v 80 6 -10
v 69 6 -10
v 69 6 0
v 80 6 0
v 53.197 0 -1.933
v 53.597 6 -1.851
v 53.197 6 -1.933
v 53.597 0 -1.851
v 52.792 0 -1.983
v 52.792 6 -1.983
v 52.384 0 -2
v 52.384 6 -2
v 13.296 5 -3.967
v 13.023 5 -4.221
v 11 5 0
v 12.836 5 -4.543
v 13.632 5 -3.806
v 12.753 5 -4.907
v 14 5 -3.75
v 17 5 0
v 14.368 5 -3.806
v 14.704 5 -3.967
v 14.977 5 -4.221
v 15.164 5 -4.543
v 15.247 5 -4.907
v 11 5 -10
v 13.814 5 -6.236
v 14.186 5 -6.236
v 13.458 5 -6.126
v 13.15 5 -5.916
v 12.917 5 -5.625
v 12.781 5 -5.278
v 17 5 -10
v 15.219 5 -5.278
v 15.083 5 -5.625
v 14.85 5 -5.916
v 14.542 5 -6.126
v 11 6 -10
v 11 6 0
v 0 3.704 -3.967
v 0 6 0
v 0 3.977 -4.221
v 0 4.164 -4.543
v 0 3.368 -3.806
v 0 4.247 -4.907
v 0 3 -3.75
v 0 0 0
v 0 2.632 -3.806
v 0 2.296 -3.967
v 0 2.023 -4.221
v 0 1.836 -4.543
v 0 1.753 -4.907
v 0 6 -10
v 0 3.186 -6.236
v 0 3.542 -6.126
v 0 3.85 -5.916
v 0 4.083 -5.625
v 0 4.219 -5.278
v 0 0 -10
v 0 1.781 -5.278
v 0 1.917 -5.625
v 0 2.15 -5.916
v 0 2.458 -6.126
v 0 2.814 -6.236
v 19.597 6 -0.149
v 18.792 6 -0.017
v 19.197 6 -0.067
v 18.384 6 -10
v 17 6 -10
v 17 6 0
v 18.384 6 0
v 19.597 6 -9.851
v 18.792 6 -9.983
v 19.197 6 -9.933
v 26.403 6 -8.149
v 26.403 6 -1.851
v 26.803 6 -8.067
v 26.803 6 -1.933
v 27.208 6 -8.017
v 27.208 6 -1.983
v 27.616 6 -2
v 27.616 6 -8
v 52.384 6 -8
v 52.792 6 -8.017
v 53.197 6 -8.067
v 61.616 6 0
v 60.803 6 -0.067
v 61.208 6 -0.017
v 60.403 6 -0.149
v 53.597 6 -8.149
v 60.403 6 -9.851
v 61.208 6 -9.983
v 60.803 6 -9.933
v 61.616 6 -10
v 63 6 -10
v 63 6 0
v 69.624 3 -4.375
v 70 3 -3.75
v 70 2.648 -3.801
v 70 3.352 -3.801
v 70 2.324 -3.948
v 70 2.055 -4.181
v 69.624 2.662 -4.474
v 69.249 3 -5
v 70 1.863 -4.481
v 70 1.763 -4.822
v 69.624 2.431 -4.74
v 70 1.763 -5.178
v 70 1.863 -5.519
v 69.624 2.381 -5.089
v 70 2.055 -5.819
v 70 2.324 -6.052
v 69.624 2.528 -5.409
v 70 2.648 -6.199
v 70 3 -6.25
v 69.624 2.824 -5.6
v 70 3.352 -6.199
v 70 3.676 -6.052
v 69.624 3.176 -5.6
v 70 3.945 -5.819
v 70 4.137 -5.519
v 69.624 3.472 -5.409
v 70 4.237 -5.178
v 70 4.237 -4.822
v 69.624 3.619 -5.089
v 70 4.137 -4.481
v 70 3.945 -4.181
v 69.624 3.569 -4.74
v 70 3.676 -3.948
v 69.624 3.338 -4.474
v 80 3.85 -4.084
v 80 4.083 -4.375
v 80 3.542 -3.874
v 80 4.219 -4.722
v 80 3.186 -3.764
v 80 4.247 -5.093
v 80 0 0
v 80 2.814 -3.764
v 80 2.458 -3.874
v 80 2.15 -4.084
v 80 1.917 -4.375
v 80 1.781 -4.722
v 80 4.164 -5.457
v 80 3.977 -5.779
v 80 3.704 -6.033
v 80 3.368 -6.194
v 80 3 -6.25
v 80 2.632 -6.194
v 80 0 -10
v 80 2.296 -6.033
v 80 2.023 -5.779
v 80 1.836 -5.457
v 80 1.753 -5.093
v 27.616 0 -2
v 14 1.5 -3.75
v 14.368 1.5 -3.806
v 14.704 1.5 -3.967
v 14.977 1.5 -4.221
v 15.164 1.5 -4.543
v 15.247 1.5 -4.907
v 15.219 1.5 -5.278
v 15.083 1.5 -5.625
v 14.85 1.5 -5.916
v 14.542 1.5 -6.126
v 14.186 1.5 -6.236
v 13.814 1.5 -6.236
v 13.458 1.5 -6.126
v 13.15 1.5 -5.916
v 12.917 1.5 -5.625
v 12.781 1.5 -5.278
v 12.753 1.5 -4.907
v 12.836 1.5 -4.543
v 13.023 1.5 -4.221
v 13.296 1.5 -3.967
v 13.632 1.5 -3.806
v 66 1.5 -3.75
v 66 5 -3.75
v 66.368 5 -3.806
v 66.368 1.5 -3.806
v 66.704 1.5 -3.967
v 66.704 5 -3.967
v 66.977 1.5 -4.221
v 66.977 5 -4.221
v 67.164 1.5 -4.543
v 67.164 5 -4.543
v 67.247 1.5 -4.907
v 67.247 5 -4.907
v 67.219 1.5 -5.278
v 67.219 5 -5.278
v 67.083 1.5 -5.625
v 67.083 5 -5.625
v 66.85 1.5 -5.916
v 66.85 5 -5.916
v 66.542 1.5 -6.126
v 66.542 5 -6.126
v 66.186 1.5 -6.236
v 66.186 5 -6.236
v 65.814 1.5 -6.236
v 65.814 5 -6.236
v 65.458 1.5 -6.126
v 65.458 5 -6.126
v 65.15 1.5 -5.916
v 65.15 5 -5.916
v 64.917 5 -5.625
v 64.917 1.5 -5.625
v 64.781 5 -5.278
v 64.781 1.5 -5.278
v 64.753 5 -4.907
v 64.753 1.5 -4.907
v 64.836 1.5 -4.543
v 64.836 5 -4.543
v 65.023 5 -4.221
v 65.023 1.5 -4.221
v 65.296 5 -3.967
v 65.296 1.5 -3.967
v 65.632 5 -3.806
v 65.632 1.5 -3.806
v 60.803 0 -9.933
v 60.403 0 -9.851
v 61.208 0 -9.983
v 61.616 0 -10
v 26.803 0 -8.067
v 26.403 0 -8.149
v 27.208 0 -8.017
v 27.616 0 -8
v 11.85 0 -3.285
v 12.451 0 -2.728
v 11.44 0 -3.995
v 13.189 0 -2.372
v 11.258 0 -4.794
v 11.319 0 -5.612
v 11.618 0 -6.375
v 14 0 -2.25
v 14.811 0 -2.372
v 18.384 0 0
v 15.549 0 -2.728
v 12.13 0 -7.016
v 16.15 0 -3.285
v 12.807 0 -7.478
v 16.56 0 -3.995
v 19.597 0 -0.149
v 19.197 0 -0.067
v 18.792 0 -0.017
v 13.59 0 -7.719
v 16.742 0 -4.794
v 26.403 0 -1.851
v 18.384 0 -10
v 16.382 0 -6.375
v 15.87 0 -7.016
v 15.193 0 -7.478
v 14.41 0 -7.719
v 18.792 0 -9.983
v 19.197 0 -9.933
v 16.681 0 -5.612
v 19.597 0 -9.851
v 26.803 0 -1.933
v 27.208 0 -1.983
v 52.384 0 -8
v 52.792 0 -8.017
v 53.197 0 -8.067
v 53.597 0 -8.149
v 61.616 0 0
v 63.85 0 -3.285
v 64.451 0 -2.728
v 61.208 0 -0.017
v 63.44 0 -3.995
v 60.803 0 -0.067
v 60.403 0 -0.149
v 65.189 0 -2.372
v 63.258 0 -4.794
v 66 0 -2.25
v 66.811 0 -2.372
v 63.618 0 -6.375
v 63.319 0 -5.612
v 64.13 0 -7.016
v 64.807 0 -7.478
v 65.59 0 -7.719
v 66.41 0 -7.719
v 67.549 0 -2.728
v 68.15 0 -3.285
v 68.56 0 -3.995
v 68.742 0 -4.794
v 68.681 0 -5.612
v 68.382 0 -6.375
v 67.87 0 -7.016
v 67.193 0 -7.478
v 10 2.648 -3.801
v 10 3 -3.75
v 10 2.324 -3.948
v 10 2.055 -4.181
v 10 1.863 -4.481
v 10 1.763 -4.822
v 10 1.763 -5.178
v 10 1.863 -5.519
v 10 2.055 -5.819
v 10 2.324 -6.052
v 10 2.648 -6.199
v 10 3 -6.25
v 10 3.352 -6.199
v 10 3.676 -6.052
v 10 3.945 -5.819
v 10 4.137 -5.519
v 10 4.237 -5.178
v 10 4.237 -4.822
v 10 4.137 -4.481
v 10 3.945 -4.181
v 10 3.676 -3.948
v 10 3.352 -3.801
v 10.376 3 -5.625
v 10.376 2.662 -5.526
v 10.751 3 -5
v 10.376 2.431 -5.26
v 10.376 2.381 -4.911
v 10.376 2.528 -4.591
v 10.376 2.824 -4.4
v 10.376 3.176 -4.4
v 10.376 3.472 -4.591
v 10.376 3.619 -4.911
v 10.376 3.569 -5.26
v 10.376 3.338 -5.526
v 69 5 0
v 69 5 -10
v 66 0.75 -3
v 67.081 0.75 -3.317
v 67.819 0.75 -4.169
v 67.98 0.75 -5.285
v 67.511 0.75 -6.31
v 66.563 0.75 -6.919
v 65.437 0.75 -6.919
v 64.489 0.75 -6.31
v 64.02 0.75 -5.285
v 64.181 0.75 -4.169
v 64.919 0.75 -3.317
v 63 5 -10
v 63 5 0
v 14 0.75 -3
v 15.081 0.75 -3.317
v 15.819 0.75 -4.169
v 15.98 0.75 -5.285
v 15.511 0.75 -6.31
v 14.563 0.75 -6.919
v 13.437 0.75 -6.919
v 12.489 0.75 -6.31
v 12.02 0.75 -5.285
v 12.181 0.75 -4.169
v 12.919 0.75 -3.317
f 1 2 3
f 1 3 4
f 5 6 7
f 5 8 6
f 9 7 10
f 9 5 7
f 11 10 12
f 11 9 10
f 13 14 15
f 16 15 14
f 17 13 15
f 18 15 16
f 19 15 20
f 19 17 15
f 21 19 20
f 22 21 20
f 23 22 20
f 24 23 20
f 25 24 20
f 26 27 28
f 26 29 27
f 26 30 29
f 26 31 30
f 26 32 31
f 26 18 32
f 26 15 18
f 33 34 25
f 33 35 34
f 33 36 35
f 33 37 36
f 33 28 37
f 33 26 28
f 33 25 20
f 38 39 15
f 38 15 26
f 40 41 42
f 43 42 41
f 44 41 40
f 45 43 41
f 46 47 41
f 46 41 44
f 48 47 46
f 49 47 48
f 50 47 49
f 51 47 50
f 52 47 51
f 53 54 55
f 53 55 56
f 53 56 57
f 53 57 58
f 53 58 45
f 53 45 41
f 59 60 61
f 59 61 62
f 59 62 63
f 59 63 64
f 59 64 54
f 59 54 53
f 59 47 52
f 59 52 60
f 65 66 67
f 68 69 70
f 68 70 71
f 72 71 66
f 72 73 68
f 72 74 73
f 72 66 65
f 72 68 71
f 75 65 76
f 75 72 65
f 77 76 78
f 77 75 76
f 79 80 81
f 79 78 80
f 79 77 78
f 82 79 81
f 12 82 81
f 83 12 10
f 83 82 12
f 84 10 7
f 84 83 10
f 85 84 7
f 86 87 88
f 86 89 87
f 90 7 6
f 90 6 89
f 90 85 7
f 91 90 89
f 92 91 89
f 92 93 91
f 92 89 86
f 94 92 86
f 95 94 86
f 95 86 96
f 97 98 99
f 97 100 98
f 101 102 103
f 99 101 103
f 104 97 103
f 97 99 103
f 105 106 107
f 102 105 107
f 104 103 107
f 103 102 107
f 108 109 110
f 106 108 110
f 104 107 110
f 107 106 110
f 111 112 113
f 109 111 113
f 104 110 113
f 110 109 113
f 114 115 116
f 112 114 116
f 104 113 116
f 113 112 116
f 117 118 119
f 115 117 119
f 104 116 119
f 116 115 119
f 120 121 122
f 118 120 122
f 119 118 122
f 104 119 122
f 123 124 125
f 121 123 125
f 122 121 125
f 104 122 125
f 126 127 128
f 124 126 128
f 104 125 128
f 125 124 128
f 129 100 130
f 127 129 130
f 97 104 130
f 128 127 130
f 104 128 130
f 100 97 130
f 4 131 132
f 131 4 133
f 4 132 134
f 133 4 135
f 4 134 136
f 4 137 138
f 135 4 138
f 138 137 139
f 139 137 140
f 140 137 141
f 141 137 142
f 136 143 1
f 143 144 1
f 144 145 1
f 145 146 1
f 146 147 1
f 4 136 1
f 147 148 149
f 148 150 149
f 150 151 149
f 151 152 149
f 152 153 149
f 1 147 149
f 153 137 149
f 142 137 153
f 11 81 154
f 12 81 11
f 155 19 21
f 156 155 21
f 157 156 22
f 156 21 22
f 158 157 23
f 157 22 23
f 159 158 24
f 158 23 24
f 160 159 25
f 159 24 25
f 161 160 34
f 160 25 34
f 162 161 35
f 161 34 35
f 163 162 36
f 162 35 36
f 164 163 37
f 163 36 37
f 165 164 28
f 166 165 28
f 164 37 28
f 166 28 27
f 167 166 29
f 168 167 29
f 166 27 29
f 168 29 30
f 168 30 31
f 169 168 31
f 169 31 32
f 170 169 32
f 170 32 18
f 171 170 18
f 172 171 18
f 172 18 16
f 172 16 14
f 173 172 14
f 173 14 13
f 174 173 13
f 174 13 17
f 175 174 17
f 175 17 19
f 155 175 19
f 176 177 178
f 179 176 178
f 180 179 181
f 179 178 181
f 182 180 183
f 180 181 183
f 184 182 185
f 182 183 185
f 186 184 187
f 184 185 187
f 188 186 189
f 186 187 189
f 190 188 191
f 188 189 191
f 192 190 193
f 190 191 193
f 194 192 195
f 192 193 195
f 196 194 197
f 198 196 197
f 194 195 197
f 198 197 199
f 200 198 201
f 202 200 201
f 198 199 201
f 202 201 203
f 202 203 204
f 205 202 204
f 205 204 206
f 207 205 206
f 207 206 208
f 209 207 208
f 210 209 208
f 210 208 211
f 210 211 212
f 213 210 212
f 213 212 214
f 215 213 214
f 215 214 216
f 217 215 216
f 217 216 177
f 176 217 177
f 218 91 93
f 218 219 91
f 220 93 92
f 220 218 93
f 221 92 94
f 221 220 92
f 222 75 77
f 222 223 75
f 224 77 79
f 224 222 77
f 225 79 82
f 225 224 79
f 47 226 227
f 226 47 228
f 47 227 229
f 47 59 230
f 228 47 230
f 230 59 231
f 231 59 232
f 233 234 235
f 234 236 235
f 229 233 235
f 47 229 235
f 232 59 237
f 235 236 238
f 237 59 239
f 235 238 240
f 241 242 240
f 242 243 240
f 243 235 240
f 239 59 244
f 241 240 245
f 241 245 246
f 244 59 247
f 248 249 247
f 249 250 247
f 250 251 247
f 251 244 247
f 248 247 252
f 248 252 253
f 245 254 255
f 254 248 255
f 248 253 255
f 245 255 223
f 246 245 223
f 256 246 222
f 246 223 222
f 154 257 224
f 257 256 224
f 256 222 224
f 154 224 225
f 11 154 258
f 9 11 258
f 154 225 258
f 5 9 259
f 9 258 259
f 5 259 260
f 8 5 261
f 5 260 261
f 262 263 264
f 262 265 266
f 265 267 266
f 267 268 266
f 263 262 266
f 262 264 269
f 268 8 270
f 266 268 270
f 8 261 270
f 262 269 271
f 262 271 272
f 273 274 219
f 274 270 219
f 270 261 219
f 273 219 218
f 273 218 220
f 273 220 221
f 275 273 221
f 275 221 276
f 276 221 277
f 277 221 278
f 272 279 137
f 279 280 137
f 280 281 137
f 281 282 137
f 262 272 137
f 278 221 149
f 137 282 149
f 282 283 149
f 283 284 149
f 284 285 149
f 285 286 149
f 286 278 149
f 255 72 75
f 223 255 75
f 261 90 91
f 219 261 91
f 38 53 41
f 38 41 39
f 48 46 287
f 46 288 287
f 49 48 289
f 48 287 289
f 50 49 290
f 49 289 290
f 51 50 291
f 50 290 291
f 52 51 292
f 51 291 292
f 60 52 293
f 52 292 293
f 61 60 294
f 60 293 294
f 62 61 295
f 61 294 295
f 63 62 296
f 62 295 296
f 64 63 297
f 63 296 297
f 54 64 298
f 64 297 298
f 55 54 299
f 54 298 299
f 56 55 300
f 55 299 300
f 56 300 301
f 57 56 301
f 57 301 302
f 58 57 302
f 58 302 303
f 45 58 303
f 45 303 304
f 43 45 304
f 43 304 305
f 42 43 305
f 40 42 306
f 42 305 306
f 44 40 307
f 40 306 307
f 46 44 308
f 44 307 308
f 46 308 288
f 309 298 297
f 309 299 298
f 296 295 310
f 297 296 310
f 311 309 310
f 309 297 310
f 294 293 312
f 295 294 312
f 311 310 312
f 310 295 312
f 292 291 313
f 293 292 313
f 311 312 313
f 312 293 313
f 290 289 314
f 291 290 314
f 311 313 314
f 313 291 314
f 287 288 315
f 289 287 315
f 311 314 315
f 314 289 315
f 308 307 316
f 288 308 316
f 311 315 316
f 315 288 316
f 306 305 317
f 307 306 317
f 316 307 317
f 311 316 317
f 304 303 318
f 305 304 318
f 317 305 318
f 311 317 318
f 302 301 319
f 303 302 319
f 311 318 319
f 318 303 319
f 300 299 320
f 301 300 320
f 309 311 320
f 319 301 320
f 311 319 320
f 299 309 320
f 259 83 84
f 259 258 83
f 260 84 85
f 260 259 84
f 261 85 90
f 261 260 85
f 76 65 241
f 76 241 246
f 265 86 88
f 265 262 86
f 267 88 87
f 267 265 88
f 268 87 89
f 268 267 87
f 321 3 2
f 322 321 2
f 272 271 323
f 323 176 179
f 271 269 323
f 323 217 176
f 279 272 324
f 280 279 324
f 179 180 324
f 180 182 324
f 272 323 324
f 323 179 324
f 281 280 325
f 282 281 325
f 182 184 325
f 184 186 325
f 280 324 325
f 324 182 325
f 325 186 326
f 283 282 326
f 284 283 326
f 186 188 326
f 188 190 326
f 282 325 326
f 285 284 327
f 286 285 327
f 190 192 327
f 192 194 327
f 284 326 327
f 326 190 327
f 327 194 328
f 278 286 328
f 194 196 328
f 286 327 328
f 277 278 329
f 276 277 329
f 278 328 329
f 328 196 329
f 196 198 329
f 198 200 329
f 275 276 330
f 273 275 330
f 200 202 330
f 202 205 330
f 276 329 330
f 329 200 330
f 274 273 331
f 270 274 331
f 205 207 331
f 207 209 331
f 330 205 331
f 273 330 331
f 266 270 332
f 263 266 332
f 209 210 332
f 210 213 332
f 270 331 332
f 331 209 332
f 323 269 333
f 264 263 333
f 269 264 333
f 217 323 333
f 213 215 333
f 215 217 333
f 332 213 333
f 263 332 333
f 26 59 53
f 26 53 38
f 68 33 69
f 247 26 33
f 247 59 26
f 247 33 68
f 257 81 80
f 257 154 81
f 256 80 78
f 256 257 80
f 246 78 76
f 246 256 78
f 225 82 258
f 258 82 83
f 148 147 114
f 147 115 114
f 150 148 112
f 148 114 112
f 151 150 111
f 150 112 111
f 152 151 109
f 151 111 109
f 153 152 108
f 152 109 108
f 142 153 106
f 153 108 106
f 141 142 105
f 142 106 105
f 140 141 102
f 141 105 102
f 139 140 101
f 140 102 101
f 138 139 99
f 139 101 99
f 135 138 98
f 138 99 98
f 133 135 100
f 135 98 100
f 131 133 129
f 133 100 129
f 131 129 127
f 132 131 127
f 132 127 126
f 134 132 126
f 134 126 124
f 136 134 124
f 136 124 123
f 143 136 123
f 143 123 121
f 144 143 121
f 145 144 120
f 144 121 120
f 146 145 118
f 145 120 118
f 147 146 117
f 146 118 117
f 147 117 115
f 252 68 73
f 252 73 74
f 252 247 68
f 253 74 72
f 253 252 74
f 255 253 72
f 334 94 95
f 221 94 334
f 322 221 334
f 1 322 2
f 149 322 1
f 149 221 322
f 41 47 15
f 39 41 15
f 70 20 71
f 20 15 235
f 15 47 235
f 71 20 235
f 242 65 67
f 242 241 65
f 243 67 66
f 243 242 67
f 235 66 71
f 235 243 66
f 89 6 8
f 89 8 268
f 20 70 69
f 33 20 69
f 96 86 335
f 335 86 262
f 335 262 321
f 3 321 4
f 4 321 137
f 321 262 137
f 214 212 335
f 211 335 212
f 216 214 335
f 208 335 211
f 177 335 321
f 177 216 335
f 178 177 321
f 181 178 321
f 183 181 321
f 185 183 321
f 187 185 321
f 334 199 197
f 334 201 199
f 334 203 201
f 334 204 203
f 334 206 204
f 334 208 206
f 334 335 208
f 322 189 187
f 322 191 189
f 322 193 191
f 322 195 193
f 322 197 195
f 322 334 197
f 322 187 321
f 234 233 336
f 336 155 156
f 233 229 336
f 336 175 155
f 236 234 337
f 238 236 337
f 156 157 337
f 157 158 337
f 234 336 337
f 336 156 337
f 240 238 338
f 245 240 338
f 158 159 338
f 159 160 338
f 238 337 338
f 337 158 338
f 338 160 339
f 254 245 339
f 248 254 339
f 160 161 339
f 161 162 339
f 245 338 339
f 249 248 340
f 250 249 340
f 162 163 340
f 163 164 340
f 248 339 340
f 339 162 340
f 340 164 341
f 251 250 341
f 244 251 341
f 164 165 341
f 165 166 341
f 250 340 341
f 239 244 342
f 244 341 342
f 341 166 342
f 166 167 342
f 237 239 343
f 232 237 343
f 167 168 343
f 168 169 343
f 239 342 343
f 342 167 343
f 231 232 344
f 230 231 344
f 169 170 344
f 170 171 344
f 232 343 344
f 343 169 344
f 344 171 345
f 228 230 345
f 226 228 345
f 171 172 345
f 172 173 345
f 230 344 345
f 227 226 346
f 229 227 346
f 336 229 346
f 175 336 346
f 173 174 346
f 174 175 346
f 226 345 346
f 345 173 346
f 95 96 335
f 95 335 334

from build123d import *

# Parameters (mm, degrees)
SKETCH1_W                                 = 80
SKETCH1_H                                 = 10
BOSS_EXTRUDE1_DEPTH                       = 6
SKETCH2_W                                 = 6
SKETCH2_H                                 = 10
CUT_EXTRUDE1_DEPTH                        = 1
TAP_DRILL_FOR_M3X0_5_TAP1_D               = 2.5
TAP_DRILL_FOR_M3X0_5_TAP1_DEPTH           = 10
TAP_DRILL_FOR_M3X0_5_TAP1_TIP             = 0.751075774
TAP_DRILL_FOR_M3X0_5_TAP1_ON_FACE_2_D     = 2.5
TAP_DRILL_FOR_M3X0_5_TAP1_ON_FACE_2_DEPTH = 10
TAP_DRILL_FOR_M3X0_5_TAP1_ON_FACE_2_TIP   = 0.751075774
TAP_DRILL_FOR_M3X0_5_TAP1_ON_FACE_3_D     = 2.5
TAP_DRILL_FOR_M3X0_5_TAP1_ON_FACE_3_DEPTH = 10
TAP_DRILL_FOR_M3X0_5_TAP1_ON_FACE_3_TIP   = 0.751075774
CHAMFER1_SIZE                             = 1.5
CUT_EXTRUDE2_REACH                        = 82.846
FILLET1_R                                 = 5


with BuildPart() as part:
    # Sketch1 → Boss-Extrude1 (new body)
    with BuildSketch(Plane(origin=(0, 0, 0), x_dir=(1, 0, 0), z_dir=(0, 1, 0))):
        with Locations((40, 5)):
            Rectangle(SKETCH1_W, SKETCH1_H)
    extrude(amount=BOSS_EXTRUDE1_DEPTH)

    # Sketch2 → Cut-Extrude1 (cut)
    with BuildSketch(Plane(origin=(0, 6, 0), x_dir=(1, 0, 0), z_dir=(0, 1, 0))):
        with Locations((14, 5)):
            Rectangle(SKETCH2_W, SKETCH2_H)
        with Locations((66, 5)):
            Rectangle(SKETCH2_W, SKETCH2_H)
    extrude(amount=-CUT_EXTRUDE1_DEPTH, mode=Mode.SUBTRACT)

    # Tap Drill for M3x0.5 Tap1
    with Locations(Plane(origin=(80, 3, -5), x_dir=(0, 0, 1), z_dir=(1, 0, 0))):
        with Locations((0, 0)):
            Hole(TAP_DRILL_FOR_M3X0_5_TAP1_D / 2, depth=TAP_DRILL_FOR_M3X0_5_TAP1_DEPTH)
            with Locations((0, 0, -(TAP_DRILL_FOR_M3X0_5_TAP1_DEPTH + TAP_DRILL_FOR_M3X0_5_TAP1_TIP / 2))):  # 118° drill point
                Cone(0, TAP_DRILL_FOR_M3X0_5_TAP1_D / 2, TAP_DRILL_FOR_M3X0_5_TAP1_TIP, mode=Mode.SUBTRACT)

    # Tap Drill for M3x0.5 Tap1 on face 2
    with Locations(Plane(origin=(66, 0, -5), x_dir=(0, 0, -1), z_dir=(0, -1, 0))):
        with Locations((0, 0), (0, -52)):
            Hole(TAP_DRILL_FOR_M3X0_5_TAP1_ON_FACE_2_D / 2, depth=TAP_DRILL_FOR_M3X0_5_TAP1_ON_FACE_2_DEPTH)
            with Locations((0, 0, -(TAP_DRILL_FOR_M3X0_5_TAP1_ON_FACE_2_DEPTH + TAP_DRILL_FOR_M3X0_5_TAP1_ON_FACE_2_TIP / 2))):  # 118° drill point
                Cone(0, TAP_DRILL_FOR_M3X0_5_TAP1_ON_FACE_2_D / 2, TAP_DRILL_FOR_M3X0_5_TAP1_ON_FACE_2_TIP, mode=Mode.SUBTRACT)

    # Tap Drill for M3x0.5 Tap1 on face 3
    with Locations(Plane(origin=(0, 3, -5), x_dir=(0, 0, -1), z_dir=(-1, 0, 0))):
        with Locations((0, 0)):
            Hole(TAP_DRILL_FOR_M3X0_5_TAP1_ON_FACE_3_D / 2, depth=TAP_DRILL_FOR_M3X0_5_TAP1_ON_FACE_3_DEPTH)
            with Locations((0, 0, -(TAP_DRILL_FOR_M3X0_5_TAP1_ON_FACE_3_DEPTH + TAP_DRILL_FOR_M3X0_5_TAP1_ON_FACE_3_TIP / 2))):  # 118° drill point
                Cone(0, TAP_DRILL_FOR_M3X0_5_TAP1_ON_FACE_3_D / 2, TAP_DRILL_FOR_M3X0_5_TAP1_ON_FACE_3_TIP, mode=Mode.SUBTRACT)

    # Chamfer1
    chamfer1_edges = [part.edges().sort_by_distance(p)[0] for p in [
        (14, 0, -6.25),
        (66, 0, -6.25),
    ]]
    chamfer(chamfer1_edges, length=CHAMFER1_SIZE)

    # Sketch6 → Cut-Extrude2 (cut, up to next)
    with BuildSketch(Plane(origin=(0, 6, 0), x_dir=(1, 0, 0), z_dir=(0, 1, 0)), mode=Mode.PRIVATE) as cut_extrude2_sk1:
        Polygon((19, 10), (27, 8), (53, 8), (61, 10), align=None)
    cut_extrude2_tool1 = extrude(cut_extrude2_sk1.sketch, amount=-CUT_EXTRUDE2_REACH, mode=Mode.PRIVATE) & part.part
    # Sketch6 → Cut-Extrude2 (cut, up to next)
    with BuildSketch(Plane(origin=(0, 6, 0), x_dir=(1, 0, 0), z_dir=(0, 1, 0)), mode=Mode.PRIVATE) as cut_extrude2_sk2:
        Polygon((19, 0), (27, 2), (53, 2), (61, 0), align=None)
    cut_extrude2_tool2 = extrude(cut_extrude2_sk2.sketch, amount=-CUT_EXTRUDE2_REACH, mode=Mode.PRIVATE) & part.part
    add(cut_extrude2_tool1.solids().sort_by_distance((40, 6, -9.078431))[0], mode=Mode.SUBTRACT)
    add(cut_extrude2_tool2.solids().sort_by_distance((40, 6, -0.921569))[0], mode=Mode.SUBTRACT)

    # Fillet1
    fillet1_edges = [part.edges().sort_by_distance(p)[0] for p in [
        (19, 3, -10),
        (61, 3, -10),
        (53, 3, -8),
        (27, 3, -8),
        (61, 3, 0),
        (19, 3, 0),
        (27, 3, -2),
        (53, 3, -2),
    ]]
    fillet(fillet1_edges, radius=FILLET1_R)


solid = part.part
